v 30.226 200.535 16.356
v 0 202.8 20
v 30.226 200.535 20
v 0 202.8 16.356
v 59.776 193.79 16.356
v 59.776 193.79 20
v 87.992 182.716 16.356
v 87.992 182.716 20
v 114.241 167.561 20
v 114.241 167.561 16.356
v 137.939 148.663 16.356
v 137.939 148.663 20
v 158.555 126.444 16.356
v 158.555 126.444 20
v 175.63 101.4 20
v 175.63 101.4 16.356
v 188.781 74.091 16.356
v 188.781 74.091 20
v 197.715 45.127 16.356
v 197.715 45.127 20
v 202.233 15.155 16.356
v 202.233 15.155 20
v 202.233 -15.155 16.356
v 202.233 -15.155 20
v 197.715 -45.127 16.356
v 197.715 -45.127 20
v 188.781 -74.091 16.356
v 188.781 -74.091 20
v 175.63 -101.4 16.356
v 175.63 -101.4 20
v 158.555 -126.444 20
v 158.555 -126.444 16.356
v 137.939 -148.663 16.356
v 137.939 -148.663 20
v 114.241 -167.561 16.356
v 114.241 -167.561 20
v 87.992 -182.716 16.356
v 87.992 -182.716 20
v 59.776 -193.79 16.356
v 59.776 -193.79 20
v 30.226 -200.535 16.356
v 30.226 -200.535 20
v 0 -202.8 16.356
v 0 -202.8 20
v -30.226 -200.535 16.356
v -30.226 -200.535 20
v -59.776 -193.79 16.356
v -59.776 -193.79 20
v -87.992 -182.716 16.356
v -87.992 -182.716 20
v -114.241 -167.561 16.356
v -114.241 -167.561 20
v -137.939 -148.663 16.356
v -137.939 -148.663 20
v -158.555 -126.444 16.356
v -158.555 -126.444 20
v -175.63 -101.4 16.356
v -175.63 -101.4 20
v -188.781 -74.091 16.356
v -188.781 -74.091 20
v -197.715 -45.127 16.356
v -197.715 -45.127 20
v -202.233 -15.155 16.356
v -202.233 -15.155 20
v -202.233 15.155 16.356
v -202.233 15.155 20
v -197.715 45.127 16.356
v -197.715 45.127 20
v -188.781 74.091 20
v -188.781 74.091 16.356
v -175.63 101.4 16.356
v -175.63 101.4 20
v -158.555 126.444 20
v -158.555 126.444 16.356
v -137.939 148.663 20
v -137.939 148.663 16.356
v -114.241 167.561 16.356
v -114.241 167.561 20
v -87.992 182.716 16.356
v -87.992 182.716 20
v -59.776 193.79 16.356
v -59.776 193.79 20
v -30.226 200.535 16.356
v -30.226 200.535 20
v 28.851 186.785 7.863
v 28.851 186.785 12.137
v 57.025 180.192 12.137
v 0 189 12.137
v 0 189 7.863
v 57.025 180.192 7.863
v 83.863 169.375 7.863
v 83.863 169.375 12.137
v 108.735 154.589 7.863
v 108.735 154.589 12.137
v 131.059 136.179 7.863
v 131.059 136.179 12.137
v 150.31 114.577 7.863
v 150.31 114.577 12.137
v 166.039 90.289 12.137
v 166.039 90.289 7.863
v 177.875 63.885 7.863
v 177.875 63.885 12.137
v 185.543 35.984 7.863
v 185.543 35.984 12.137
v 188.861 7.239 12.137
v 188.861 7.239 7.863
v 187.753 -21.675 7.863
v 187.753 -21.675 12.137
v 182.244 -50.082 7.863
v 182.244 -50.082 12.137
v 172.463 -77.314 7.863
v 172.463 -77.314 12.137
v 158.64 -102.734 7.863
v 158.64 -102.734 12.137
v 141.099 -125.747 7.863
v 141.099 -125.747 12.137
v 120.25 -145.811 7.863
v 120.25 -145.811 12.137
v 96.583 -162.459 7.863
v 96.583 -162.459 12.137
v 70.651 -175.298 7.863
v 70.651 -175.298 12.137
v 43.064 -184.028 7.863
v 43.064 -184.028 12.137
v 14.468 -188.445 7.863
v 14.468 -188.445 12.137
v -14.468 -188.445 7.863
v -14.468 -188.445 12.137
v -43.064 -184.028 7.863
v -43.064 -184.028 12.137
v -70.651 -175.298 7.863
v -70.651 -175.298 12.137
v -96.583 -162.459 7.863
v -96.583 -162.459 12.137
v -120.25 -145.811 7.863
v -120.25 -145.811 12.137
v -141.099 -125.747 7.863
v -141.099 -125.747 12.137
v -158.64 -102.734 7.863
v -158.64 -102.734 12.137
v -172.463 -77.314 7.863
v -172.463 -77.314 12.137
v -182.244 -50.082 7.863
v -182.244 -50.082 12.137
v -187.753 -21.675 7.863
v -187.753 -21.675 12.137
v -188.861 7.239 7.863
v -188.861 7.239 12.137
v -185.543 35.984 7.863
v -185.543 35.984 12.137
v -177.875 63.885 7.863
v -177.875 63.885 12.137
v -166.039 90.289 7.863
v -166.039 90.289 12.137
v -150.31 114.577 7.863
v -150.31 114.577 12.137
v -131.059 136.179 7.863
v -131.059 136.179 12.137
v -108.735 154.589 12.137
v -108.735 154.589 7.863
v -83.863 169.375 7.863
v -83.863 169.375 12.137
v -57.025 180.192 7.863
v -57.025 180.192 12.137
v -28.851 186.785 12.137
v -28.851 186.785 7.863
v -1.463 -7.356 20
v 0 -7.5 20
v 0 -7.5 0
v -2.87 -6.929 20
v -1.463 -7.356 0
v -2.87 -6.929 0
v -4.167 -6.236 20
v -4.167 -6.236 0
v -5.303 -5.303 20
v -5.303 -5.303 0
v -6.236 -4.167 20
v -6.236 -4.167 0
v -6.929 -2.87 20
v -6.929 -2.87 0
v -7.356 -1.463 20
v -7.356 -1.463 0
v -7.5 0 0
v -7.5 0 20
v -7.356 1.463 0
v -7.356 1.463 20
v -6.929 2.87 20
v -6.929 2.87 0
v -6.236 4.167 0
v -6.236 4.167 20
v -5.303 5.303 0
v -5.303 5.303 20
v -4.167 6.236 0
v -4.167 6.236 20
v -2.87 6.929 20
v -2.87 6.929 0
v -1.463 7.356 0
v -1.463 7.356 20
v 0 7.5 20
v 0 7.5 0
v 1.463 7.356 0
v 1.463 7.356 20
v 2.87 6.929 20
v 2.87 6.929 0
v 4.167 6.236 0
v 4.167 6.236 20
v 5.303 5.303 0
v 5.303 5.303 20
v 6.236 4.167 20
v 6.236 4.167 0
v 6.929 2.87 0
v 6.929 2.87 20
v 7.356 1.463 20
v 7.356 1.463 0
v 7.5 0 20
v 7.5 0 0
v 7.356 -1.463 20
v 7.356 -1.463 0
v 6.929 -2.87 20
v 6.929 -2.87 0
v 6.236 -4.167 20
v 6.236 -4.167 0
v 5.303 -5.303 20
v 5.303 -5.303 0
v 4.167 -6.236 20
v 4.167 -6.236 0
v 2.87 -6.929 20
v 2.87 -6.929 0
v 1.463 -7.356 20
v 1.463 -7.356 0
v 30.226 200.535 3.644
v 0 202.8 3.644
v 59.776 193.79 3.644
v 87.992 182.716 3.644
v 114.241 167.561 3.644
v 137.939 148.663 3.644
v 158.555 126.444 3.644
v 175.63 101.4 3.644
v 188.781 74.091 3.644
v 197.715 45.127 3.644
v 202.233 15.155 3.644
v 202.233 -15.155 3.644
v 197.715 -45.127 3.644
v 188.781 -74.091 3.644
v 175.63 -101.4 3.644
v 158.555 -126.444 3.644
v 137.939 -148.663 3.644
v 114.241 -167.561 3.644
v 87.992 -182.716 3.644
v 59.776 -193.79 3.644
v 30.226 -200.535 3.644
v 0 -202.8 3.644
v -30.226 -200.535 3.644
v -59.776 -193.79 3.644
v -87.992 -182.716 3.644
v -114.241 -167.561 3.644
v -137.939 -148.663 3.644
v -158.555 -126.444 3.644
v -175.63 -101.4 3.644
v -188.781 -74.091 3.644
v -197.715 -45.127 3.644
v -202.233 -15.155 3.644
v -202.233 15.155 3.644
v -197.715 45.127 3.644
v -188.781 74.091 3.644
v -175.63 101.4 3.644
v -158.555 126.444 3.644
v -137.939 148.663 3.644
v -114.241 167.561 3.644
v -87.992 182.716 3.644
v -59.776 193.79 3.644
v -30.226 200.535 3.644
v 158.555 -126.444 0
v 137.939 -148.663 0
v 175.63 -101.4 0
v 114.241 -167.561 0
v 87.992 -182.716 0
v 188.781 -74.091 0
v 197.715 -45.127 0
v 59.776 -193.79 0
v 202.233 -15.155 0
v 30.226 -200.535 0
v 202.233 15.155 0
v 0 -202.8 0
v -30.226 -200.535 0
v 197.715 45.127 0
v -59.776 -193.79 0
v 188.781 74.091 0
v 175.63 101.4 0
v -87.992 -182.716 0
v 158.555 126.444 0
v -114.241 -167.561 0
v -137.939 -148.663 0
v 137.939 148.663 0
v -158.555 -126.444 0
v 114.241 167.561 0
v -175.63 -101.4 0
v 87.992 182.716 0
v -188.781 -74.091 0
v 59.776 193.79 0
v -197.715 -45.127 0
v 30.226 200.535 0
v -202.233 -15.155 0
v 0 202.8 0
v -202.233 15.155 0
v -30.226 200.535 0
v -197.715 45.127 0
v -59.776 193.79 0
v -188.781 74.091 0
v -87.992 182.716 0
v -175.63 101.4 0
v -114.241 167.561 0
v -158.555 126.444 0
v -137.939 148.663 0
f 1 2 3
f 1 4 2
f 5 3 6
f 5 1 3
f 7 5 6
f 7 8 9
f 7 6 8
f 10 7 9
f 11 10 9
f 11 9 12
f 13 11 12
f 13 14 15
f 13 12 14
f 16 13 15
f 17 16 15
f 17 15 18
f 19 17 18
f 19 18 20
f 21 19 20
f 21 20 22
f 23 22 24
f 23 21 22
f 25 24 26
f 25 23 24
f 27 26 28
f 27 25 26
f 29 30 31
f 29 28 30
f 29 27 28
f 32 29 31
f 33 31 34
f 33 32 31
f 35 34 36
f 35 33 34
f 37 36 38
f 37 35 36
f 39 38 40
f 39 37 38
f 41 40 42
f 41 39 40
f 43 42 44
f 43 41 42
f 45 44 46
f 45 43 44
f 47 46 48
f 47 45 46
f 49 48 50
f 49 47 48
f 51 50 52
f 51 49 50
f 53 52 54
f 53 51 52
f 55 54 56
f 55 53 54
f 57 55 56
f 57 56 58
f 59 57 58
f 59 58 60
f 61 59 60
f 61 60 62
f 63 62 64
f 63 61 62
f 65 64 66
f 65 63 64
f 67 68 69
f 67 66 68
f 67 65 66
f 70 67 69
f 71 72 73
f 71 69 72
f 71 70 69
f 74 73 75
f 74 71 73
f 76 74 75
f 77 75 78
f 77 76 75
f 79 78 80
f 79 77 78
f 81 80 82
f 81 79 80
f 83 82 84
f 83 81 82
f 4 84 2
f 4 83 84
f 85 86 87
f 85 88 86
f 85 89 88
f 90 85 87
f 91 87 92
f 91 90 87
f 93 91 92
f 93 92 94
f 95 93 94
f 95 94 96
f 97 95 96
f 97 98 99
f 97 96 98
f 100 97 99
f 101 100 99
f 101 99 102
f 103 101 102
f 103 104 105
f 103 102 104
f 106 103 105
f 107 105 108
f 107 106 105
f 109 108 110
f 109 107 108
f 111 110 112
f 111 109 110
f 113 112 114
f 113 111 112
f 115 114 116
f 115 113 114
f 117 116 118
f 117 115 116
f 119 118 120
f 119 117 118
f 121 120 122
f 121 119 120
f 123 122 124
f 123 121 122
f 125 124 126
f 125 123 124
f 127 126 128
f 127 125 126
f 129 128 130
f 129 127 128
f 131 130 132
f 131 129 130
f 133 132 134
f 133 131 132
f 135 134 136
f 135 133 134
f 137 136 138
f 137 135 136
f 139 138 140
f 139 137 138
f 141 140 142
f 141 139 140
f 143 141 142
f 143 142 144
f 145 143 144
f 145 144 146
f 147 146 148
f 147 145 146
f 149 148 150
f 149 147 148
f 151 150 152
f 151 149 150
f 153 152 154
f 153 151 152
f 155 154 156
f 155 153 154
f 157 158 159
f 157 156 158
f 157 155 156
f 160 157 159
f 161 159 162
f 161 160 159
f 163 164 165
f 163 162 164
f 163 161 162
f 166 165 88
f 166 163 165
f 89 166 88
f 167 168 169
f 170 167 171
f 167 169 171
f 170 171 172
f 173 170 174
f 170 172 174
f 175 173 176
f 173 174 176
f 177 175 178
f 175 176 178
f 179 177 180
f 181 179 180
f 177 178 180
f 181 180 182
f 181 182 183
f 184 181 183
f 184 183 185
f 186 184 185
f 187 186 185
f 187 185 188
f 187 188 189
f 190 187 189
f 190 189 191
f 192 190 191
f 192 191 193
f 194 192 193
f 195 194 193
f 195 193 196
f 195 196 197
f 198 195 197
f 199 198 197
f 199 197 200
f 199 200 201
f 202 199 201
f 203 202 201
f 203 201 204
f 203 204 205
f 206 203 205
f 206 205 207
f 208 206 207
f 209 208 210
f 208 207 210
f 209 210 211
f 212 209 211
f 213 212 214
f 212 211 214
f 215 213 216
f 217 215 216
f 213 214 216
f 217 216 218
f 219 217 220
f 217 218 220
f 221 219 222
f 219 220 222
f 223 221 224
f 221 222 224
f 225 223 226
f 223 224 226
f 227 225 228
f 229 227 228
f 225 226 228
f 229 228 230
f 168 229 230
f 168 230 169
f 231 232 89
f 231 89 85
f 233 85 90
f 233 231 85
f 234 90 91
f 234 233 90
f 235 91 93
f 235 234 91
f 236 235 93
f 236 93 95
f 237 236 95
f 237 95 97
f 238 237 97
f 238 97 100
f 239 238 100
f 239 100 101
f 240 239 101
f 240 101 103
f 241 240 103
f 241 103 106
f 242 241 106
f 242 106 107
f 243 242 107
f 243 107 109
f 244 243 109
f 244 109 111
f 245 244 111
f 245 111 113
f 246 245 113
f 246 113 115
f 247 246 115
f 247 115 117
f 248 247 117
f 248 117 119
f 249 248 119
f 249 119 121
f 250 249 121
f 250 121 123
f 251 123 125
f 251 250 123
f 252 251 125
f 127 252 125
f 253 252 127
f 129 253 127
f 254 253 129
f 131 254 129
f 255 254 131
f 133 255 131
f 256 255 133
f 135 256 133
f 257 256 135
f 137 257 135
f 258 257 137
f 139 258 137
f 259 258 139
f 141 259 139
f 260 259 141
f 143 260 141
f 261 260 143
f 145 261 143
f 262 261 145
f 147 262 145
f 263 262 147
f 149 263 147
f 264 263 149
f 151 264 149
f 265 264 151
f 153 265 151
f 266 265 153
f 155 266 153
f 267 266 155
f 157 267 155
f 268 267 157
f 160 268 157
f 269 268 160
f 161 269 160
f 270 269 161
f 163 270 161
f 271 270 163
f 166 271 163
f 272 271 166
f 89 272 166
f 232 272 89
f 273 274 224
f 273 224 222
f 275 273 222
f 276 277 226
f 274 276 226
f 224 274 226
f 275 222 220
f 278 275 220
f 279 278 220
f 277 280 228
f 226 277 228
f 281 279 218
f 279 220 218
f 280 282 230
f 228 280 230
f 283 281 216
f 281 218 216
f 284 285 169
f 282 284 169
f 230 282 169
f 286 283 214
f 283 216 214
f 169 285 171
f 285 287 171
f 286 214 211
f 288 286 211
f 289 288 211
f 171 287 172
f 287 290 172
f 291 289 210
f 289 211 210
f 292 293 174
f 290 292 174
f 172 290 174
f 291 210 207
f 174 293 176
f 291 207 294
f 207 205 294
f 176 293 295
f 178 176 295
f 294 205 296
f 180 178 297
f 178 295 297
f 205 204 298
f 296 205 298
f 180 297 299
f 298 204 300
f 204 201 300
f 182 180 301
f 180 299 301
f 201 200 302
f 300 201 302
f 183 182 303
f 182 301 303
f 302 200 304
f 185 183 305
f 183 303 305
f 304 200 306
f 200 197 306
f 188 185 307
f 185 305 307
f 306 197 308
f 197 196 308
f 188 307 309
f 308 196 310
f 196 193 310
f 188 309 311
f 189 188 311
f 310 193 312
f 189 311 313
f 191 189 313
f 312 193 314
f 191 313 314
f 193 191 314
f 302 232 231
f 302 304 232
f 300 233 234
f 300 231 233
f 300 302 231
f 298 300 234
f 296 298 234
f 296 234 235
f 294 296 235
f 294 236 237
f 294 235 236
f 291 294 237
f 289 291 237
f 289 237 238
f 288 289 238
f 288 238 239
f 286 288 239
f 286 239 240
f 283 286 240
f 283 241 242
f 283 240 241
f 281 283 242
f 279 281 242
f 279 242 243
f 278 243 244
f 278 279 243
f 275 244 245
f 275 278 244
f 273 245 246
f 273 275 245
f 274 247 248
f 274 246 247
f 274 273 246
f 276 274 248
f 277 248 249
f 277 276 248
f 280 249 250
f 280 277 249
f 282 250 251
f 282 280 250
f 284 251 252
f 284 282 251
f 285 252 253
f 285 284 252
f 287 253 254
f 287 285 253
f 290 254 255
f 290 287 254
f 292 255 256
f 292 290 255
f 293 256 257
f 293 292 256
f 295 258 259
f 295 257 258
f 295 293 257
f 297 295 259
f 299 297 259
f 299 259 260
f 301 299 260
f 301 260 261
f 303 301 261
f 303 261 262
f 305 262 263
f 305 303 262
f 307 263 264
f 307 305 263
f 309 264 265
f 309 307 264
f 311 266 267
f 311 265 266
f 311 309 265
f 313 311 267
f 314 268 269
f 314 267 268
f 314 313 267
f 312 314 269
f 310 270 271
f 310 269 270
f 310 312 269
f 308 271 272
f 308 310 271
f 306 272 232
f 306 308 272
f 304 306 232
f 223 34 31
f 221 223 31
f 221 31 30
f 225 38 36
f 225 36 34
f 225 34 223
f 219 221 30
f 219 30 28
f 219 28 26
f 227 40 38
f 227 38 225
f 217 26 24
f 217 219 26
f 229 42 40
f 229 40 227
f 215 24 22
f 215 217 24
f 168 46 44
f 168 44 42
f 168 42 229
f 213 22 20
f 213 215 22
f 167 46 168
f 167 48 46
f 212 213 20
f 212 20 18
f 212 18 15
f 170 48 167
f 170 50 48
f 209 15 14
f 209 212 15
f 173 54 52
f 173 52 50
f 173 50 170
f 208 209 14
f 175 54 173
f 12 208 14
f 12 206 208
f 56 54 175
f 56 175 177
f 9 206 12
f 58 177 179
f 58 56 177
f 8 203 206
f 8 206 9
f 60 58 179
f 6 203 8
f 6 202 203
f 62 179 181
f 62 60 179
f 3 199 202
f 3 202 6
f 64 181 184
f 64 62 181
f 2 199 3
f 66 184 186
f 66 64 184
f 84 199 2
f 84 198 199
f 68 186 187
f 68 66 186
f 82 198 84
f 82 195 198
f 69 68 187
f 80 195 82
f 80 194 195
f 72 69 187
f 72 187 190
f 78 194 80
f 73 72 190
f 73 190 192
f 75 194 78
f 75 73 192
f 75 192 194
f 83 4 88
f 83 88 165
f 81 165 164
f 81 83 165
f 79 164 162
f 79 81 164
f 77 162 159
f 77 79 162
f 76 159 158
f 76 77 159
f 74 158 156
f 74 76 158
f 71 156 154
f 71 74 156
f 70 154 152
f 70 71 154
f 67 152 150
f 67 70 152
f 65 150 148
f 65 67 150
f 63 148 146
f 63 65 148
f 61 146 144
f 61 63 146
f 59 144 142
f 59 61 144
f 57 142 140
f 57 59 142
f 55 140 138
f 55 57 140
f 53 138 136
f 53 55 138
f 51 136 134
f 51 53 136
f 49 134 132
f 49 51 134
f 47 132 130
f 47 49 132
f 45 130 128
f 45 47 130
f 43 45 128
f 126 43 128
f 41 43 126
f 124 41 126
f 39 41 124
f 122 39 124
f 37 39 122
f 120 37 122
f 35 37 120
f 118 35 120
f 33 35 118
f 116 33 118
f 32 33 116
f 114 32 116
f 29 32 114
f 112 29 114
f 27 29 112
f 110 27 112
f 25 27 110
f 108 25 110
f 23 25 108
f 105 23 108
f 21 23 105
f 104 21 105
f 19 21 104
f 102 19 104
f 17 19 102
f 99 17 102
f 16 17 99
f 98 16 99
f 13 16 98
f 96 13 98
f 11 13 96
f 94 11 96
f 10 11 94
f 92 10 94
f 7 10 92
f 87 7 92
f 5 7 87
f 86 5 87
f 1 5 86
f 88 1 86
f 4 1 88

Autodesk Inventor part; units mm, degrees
ref_plane "YZ Plane" through (0, 0, 0) normal (1, 0, 0) x (0, 1, 0)
ref_plane "XZ Plane" through (0, 0, 0) normal (0, 1, 0) x (-1, 0, 0)
sketch "Boceto principal" plane through (0, 0, 0) normal (1, 0, 0) x (0, 1, 0)
  line L0 (0, 20) -> (202.8, 20)
  line L1 (202.8, 20) -> (202.8, 16.356)
  line L2 (202.8, 16.356) -> (189, 12.137)
  line L3 (189, 12.137) -> (189, 7.863)
  line L4 (189, 7.863) -> (202.8, 3.644)
  line L5 (202.8, 3.644) -> (202.8, 0)
  line L6 (202.8, 0) -> (0, 0)
  line L7 (200, 15.5) -> (200, 4.5) construction
  line L8 (189, 10) -> (200, 10) construction
  line L9 (202.8, 16.356) -> (202.8, 3.644)
  line L10 (0, -4) -> (0, 24) projected
  line L11 (0, 0) -> (0, 20)
  dimension "d0" = 11
  dimension "d1" = 34
  dimension "d2" = 2.8
  dimension "d6" = 20
  dimension "d21" = 400
  dimension "d25" = 13.8
  dimension "d27" = 10
ref_plane "Plano de correa" through (0, 189, 10) normal (0, 0, 1) x (1, 0, 0)
revolve "Cuerpo" add sketch "Boceto principal" angle 360 about axis through (0, 0, -10) along (0, 0, 1)
revolve "Para ranuras" cut sketch "Boceto principal" angle 360 about axis through (0, 0, -10) along (0, 0, 1) contours L9 L4 L3 L2
fillet "Empalme externo" [suppressed]
fillet "Empalme interno" [suppressed]
pattern_of_one "Patrón para ranuras"
sketch "Boceto2" plane through (0, 0, 20) normal (0, 0, 1) x (1, 0, 0)
  point P0 (0, 0)
  point P1 (0, 0)
hole "Agujero1" at (0, 0, 20) direction (0, 0, -1) diameter 15 end through all
equation "\"d0\" = da_Bw"
equation "\"d1\" = da_Alfa"
equation "\"d2\" = da_c"
equation "\"d21\" = da_Dw"
equation "\"d25\" = da_Hd"
equation "\"d27\" = da_Se"
equation "\"da_r1\" = 0"
equation "\"da_r2\" = 0"
equation "\"d18\" = da_Sg"
equation "\"da_Bw\" = 11"
equation "\"da_Alfa\" = 34deg"
equation "\"da_c\" = 2.8"
equation "\"da_Dw\" = 400"
equation "\"da_Hd\" = 13.8"
equation "\"da_Se\" = 10"
equation "\"da_Sg\" = 15"
properties part number "Polea ranurada2" material "Steel"
